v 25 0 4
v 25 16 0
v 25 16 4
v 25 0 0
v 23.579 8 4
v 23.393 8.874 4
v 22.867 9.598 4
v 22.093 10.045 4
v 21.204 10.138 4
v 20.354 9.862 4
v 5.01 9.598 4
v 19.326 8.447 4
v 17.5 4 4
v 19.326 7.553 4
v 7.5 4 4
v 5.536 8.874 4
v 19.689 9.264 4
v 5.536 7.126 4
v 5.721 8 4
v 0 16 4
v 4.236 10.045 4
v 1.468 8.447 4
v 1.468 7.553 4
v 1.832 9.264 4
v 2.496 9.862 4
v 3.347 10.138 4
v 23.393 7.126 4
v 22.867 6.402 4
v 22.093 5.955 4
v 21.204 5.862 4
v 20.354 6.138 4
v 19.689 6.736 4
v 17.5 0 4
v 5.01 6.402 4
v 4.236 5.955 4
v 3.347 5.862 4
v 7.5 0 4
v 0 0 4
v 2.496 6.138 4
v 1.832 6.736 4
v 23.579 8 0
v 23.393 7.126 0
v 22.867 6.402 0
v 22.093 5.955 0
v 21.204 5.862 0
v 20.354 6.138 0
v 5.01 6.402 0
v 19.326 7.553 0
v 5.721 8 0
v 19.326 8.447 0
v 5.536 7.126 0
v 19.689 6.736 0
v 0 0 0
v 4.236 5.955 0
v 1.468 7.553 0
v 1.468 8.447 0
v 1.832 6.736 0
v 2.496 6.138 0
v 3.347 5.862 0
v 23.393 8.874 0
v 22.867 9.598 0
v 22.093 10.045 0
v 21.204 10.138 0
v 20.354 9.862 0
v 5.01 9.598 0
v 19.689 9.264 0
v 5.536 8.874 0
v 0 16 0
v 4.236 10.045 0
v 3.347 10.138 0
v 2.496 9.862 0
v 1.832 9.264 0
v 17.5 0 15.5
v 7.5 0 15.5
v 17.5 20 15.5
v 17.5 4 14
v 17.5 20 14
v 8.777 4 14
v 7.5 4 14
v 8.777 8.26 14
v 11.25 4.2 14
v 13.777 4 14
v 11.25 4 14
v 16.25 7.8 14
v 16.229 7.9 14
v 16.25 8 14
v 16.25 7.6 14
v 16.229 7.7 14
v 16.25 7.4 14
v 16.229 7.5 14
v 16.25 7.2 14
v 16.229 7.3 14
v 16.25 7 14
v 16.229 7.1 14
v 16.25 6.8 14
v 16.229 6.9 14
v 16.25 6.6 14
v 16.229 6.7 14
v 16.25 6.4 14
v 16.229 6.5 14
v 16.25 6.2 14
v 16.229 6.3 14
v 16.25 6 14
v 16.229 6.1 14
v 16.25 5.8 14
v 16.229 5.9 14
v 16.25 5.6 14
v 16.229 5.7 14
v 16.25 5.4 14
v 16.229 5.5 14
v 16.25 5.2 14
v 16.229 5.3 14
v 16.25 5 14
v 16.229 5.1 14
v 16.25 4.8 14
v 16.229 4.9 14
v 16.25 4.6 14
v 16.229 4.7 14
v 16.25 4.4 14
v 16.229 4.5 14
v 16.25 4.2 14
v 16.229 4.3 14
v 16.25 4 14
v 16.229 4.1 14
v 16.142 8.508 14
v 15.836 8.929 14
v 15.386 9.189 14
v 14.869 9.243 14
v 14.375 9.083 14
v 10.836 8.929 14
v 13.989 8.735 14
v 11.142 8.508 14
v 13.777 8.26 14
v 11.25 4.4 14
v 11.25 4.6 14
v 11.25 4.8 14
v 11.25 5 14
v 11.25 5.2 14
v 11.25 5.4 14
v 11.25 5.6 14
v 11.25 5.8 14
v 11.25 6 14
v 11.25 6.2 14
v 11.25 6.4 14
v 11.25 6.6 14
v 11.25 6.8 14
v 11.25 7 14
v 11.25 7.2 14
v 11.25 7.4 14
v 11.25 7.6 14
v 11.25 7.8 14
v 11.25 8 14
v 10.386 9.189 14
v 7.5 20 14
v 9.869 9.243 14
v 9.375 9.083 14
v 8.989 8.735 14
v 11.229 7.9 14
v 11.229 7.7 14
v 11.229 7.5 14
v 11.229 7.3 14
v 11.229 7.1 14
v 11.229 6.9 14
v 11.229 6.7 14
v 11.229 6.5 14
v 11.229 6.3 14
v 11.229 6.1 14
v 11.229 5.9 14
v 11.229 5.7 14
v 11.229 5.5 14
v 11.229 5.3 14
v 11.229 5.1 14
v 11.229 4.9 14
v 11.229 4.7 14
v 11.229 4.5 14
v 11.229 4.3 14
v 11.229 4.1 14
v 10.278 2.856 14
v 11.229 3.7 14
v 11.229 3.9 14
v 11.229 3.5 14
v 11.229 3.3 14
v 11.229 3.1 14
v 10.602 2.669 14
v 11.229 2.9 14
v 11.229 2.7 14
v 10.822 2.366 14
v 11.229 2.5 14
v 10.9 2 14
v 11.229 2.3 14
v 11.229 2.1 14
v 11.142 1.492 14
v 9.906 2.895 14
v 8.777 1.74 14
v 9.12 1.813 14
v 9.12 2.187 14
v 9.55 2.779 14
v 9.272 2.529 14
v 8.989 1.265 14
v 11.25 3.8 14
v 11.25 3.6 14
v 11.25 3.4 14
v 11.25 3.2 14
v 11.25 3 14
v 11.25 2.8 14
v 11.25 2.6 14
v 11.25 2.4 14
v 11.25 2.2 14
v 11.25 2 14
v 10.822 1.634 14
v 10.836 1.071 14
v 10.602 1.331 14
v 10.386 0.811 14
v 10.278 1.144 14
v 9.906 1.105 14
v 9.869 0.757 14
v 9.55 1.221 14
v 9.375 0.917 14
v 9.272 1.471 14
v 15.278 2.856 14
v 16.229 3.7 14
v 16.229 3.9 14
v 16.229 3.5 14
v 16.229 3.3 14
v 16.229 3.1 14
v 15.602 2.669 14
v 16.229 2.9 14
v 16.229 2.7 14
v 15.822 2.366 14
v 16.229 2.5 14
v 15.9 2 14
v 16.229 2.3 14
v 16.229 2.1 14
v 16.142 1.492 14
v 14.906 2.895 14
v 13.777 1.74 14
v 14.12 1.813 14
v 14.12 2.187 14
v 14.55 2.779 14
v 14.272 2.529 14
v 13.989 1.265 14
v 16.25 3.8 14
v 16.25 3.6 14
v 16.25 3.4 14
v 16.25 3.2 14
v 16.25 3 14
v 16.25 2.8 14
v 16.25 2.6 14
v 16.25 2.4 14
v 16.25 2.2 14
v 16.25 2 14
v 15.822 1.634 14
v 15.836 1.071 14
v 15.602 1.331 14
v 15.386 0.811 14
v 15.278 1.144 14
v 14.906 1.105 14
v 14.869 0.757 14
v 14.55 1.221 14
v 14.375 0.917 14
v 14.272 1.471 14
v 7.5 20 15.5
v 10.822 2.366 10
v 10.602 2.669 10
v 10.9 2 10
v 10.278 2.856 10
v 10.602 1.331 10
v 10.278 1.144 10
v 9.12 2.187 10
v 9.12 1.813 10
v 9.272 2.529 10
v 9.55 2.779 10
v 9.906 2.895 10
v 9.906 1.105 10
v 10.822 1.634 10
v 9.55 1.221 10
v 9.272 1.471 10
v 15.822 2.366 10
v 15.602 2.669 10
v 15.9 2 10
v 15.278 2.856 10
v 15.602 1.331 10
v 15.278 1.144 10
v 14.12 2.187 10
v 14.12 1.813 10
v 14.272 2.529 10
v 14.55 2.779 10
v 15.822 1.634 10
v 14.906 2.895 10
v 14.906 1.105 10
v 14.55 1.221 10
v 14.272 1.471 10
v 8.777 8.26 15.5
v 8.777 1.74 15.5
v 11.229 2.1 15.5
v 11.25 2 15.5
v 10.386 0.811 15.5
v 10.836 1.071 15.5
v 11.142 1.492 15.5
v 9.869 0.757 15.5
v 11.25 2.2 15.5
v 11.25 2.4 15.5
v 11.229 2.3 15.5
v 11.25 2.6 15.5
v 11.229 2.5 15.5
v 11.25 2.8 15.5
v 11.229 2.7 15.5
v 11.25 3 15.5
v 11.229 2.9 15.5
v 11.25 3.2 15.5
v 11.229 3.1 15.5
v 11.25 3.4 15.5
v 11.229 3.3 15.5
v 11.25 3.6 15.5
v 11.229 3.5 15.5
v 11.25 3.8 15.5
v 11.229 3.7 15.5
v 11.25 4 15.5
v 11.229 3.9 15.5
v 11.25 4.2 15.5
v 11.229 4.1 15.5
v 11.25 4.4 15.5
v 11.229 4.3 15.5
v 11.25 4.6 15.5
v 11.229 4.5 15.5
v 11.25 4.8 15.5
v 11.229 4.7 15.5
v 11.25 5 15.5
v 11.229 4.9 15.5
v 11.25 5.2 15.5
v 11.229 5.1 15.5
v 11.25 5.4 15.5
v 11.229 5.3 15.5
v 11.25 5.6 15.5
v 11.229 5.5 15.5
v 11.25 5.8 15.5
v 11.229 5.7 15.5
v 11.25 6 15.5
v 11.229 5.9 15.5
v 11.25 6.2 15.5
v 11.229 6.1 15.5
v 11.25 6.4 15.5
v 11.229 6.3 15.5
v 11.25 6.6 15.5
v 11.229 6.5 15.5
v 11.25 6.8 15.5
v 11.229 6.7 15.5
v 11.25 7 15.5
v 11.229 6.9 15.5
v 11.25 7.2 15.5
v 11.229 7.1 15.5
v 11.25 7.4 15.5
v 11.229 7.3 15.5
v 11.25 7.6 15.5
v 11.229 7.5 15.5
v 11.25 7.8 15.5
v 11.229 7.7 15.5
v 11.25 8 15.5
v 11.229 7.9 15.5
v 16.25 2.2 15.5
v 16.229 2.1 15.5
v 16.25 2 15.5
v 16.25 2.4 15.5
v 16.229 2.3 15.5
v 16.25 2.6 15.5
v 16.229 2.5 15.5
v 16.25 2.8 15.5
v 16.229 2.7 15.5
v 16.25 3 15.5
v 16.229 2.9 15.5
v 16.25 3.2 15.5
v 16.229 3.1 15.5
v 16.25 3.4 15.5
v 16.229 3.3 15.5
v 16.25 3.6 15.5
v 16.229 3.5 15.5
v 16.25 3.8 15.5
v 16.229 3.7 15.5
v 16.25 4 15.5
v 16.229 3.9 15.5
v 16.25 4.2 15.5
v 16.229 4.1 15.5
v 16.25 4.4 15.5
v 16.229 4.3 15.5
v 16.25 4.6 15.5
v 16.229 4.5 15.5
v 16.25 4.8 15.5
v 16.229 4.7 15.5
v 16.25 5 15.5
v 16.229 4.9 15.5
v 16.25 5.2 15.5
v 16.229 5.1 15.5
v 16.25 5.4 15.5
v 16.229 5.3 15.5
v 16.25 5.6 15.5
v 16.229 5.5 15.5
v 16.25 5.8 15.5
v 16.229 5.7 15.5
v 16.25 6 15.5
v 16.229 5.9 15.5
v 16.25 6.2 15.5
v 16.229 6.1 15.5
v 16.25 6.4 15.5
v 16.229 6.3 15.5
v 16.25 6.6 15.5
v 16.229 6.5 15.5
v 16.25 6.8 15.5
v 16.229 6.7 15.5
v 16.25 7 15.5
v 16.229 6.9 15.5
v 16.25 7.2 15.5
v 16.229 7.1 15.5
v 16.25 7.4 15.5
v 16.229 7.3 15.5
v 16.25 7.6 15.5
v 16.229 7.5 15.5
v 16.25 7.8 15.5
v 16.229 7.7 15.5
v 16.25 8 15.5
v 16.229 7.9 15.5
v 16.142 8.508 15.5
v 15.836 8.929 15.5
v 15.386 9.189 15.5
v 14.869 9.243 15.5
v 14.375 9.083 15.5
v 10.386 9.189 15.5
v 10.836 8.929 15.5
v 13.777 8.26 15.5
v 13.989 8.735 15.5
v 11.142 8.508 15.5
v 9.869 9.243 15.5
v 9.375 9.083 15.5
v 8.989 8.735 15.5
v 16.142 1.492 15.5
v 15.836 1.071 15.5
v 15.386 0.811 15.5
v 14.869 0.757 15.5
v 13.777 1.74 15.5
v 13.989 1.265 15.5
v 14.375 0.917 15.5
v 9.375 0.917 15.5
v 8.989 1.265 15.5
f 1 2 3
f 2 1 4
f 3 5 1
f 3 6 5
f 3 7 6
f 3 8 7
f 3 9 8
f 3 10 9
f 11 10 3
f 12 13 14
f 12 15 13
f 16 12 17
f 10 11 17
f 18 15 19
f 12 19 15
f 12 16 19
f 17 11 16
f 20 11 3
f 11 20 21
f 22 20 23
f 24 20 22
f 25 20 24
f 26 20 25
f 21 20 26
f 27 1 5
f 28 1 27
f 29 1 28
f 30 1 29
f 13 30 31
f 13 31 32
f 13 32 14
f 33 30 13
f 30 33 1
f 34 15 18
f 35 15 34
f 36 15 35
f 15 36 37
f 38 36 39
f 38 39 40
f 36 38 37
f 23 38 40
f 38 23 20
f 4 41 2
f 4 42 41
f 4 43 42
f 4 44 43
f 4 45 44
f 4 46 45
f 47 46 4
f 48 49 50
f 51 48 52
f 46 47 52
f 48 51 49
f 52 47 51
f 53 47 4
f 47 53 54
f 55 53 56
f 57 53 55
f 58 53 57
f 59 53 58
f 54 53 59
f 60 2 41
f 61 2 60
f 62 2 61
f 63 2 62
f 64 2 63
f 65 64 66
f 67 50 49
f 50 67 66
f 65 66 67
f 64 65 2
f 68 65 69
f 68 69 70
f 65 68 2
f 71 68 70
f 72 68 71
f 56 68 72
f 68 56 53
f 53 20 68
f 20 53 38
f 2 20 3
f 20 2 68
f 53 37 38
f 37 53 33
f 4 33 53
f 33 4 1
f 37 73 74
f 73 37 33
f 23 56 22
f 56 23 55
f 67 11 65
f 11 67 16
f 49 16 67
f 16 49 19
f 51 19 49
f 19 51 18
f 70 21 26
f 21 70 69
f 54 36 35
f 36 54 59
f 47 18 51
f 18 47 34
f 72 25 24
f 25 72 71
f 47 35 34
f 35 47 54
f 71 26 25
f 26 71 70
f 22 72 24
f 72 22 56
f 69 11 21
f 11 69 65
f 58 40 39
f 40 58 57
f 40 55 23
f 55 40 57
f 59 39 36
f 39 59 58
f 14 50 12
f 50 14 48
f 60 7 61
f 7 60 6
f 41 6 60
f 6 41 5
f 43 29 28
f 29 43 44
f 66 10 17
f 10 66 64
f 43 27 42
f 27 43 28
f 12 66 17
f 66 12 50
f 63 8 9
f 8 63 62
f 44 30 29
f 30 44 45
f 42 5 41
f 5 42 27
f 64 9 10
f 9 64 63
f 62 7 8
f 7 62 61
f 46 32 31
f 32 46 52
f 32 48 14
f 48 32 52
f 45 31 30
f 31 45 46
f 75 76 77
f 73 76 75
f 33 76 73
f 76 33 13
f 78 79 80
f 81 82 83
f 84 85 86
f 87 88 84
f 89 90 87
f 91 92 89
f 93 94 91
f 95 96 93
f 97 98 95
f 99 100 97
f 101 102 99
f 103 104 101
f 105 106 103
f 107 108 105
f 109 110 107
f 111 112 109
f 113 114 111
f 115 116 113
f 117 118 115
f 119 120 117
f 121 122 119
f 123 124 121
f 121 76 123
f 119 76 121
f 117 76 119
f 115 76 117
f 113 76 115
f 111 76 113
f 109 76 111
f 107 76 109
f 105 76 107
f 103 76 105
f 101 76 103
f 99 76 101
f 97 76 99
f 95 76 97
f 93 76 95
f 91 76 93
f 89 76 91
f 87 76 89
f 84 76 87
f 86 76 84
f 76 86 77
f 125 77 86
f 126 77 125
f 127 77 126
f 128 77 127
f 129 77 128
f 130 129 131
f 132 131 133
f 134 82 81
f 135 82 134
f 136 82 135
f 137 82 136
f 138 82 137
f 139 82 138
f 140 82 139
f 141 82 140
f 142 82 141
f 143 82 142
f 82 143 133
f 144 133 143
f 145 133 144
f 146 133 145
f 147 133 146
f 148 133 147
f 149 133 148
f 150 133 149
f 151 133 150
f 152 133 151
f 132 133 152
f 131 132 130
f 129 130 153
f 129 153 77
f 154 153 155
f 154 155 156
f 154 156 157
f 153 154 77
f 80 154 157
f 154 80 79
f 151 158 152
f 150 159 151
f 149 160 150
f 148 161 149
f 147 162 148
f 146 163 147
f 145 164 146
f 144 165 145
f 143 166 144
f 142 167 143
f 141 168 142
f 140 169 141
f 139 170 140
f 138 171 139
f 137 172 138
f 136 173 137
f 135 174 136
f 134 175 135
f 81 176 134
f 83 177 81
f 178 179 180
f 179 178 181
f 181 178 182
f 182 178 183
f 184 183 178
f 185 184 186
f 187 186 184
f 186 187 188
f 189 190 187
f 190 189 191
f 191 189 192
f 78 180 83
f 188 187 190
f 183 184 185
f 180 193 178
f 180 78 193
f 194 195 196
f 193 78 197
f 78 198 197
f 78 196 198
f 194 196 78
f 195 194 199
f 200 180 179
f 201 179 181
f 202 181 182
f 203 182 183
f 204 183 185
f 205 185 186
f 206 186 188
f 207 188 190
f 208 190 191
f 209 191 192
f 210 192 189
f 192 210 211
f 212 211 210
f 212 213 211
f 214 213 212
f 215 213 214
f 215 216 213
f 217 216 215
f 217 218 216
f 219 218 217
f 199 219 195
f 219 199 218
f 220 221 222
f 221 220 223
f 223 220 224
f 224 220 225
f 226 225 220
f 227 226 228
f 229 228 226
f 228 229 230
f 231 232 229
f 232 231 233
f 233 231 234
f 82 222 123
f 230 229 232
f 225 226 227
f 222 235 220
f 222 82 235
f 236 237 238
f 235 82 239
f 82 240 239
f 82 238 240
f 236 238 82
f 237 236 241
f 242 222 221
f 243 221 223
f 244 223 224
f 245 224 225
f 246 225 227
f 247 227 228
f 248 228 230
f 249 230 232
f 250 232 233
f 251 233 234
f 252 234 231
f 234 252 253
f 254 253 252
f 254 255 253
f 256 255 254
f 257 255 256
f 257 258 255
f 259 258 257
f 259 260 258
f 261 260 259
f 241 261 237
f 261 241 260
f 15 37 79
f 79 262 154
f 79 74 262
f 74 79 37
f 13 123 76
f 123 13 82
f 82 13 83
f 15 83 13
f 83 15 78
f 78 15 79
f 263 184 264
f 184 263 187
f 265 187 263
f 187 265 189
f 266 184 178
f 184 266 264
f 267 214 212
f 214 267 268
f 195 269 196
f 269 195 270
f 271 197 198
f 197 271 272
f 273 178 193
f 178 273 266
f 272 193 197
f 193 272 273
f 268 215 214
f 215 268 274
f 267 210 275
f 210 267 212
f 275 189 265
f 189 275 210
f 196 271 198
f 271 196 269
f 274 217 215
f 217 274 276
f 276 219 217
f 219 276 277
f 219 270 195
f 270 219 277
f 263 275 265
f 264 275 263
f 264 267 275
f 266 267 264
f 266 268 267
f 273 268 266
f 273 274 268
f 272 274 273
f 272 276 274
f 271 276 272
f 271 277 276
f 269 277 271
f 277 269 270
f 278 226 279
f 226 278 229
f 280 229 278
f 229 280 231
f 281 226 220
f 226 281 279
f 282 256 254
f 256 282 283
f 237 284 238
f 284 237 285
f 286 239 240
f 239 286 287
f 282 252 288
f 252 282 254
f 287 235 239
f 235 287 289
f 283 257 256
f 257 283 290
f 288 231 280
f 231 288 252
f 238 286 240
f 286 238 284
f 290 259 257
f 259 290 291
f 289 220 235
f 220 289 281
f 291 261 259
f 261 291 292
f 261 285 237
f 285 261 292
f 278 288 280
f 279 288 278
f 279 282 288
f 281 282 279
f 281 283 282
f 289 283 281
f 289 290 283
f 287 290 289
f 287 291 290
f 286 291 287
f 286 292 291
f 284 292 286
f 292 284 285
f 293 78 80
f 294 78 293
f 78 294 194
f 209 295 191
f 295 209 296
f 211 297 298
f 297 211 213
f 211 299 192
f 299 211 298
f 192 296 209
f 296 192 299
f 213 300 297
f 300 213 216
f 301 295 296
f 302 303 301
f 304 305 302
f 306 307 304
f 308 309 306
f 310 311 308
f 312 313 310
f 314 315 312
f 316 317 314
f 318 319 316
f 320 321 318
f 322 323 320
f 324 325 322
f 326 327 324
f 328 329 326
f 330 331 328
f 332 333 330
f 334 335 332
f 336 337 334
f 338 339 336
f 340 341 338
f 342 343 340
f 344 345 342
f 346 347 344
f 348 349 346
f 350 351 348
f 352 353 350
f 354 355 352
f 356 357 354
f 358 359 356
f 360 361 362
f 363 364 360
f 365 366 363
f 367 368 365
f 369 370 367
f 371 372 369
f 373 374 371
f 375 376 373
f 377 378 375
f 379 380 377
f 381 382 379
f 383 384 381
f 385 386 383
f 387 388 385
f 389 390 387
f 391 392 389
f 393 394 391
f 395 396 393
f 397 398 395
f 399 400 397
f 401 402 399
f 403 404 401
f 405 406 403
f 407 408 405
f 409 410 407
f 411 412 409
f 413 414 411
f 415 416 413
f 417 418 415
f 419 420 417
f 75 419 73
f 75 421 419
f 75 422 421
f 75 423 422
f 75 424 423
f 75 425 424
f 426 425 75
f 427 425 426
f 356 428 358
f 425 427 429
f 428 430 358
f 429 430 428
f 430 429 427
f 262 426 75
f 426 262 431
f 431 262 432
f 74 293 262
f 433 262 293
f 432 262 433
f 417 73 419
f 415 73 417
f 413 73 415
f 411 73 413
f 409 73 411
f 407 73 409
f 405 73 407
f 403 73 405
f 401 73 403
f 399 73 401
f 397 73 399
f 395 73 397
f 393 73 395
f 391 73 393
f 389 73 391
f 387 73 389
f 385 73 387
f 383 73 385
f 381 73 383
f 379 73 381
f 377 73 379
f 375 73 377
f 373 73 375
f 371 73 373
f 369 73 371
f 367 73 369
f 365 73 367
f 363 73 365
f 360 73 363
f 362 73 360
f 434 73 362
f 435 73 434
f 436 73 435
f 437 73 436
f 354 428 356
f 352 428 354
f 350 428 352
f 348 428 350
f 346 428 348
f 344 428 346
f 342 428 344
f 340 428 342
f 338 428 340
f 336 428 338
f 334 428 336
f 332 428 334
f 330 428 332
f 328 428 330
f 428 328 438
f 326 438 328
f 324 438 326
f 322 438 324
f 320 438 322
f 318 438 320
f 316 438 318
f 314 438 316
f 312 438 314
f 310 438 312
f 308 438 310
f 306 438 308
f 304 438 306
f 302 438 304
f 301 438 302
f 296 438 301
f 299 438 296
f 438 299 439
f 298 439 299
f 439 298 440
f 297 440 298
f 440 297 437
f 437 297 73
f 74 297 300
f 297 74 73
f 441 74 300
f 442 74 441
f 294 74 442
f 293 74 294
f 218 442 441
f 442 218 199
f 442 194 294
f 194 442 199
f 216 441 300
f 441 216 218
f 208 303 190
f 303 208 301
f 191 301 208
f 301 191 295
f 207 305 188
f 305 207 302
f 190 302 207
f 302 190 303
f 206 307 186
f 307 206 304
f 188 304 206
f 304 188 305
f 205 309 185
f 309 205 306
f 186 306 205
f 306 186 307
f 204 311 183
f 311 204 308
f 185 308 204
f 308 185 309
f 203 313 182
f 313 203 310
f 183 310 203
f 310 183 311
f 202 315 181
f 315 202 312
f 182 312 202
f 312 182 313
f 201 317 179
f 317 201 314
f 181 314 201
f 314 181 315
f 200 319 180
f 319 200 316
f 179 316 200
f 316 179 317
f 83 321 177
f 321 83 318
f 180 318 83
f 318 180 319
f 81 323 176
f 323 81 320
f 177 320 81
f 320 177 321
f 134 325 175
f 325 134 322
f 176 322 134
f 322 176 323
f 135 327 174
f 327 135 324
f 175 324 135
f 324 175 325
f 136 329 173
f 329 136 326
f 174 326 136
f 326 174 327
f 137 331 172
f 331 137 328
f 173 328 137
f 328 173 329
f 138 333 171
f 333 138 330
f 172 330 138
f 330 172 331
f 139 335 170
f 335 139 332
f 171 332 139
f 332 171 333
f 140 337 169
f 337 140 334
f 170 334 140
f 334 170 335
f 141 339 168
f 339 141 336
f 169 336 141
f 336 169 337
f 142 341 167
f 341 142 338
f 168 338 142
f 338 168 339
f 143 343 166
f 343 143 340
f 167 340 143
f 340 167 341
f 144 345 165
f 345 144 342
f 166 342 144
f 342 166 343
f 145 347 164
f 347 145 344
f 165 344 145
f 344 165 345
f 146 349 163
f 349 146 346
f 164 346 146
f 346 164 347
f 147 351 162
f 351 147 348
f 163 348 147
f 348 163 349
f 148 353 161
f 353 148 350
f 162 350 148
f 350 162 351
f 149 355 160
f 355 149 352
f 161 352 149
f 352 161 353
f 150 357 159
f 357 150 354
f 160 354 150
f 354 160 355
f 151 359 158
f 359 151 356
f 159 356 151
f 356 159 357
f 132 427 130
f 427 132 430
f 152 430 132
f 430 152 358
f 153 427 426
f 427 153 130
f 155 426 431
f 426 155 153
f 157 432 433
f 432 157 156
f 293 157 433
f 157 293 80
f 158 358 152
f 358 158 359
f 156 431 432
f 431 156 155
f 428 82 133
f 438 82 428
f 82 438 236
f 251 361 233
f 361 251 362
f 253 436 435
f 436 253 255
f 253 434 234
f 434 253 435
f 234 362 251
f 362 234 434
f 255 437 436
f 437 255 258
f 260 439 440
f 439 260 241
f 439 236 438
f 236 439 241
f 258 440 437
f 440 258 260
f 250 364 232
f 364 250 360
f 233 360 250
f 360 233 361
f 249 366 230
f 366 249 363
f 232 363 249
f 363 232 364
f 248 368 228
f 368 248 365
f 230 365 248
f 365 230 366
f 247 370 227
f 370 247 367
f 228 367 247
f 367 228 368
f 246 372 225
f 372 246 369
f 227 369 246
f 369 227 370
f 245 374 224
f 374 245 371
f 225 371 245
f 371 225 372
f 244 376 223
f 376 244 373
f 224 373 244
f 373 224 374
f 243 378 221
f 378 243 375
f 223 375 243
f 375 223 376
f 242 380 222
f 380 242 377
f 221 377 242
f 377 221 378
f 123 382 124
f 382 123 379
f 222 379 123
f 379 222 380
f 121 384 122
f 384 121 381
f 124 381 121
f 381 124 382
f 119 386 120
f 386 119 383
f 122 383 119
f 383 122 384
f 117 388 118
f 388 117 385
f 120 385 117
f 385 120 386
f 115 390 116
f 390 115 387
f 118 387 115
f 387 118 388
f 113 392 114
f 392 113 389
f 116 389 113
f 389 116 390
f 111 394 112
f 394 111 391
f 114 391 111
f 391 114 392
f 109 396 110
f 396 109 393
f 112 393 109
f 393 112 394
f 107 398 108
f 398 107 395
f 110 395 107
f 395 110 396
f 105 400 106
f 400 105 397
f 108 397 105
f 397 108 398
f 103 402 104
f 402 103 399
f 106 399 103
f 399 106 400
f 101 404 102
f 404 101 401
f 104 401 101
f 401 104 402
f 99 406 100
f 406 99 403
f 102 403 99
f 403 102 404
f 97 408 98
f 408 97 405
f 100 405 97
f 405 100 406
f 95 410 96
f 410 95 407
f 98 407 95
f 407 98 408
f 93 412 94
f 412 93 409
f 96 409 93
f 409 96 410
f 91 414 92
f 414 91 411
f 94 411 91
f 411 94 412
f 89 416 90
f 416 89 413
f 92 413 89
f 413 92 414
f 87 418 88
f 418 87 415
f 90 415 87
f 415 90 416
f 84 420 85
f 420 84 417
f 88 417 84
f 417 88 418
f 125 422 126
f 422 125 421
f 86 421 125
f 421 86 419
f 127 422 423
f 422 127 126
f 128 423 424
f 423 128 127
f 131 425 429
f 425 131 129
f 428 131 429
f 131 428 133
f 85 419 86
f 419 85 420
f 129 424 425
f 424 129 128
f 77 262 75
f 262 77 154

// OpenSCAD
WallThickness = 4;

BaseWidth = 25;
BaseDepth = 16;
BaseHoleDiameter = 4.3;

BaseToFlagDistance = 10+WallThickness;
BaseToFlagWidth = 10;

FlagThickness = 1.5;
FlagHeight = 20;

AdjustHoleOutsideDiameter = 2.5;
AdjustHoleInsideDiameter = 1.8;

difference() {
    cube(size=[BaseWidth, BaseDepth, WallThickness], center=false);
    translate([BaseWidth/7, BaseDepth/2, 0])
    cylinder(h=WallThickness, d=BaseHoleDiameter, center=false, $fn=15);
    translate([BaseWidth/7*6, BaseDepth/2, 0])
    cylinder(h=WallThickness, d=BaseHoleDiameter, center=false, $fn=15);
    
}

translate([(BaseWidth-BaseToFlagWidth)/2, 0, 0])
difference() {
cube(size=[BaseToFlagWidth, WallThickness, BaseToFlagDistance], center=false);
    translate([BaseToFlagWidth/4, WallThickness/2, BaseToFlagDistance-WallThickness])
    cylinder(h=WallThickness, d=AdjustHoleInsideDiameter, center=false, $fn=15);
    translate([BaseToFlagWidth/4*3, WallThickness/2, BaseToFlagDistance-WallThickness])
    cylinder(h=WallThickness, d=AdjustHoleInsideDiameter, center=false, $fn=15);
}

// Flag
translate([(BaseWidth-BaseToFlagWidth)/2, 0, BaseToFlagDistance])

difference() {
cube(size=[BaseToFlagWidth, FlagHeight, FlagThickness], center=false);

for ( i = [0 : 30] ){
    translate([BaseToFlagWidth/4, WallThickness/2+i*0.2, 0])
    cylinder(h=FlagThickness, d=AdjustHoleOutsideDiameter, center=false, $fn=15);
}
for ( i = [0 : 30] ){
    translate([BaseToFlagWidth/4*3, WallThickness/2+i*0.2, 0])
    cylinder(h=FlagThickness, d=AdjustHoleOutsideDiameter, center=false, $fn=15);
}
}



/*
WallThickness = 1.5;
BaseHeight = 123+WallThickness*2;
BaseWidth = 101+WallThickness*2;
BaseDepth = 30;
CornerRadius = 3;

LCDWidth = 80.5;
LCDHeight = 50.5;
LCDTopOffset = 9+WallThickness;
LCDLeftOffset = 9+WallThickness;

ResetButtonDiameter = 6;
ResetButtonBottomOffet = 8.5+WallThickness;
ResetButtonLeftOffet = 70.5+WallThickness;

RotaryEncoderDiameter = 8;
RotaryEncoderBottomOffet = 19+WallThickness;
RotaryEncoderLeftOffet = 87.5+WallThickness;

CardButtonDiameter = 6;
CardButtonBottomOffet = 44.5+WallThickness;
CardButtonLeftOffet = 78.5+WallThickness;

TFCardHeight = 2;
TFCardWidth = 14;
TFCardBottomOffset = 15+WallThickness;
TFCardFrontOffset = 19+WallThickness;

MountingHoleDiameter = 5.5;

module RoundedRectangle($Width=BaseWidth, $Depth=BaseDepth, $Radius=CornerRadius) 
{
    polygon(points = [[$Radius, 0], [$Width-$Radius, 0],[$Width, $Radius], [$Width, $Depth-$Radius], [$Width-$Radius, $Depth], [$Radius, $Depth], [0, $Depth-$Radius], [0, $Radius]], paths=[[0,1,2,3,4,5,6,7]]);
        
    translate([$Radius,$Radius,0]){
        circle(r=$Radius);
    }        
    translate([$Width-$Radius,$Radius,0]){
        circle(r=$Radius);
    }
    
    translate([$Width-$Radius,$Depth-$Radius,0]){ 
        circle(r=$Radius);
    }
   
    translate([$Radius,$Depth-$Radius,0]){ 
        circle(r=$Radius);
    }
}

module base3D($Width=BaseWidth, $Depth=BaseDepth, $Height=BaseHeight, $Radius=CornerRadius, $Thickness=WallThickness)
{
    difference()
    {
        linear_extrude(height = $Height, center = false, convexity = 0, twist = 0)
        RoundedRectangle($Width, $Depth, $Radius);
        translate([$Thickness, $Thickness, $Thickness]) {
        linear_extrude(height = $Height, center = false, convexity = 0, twist = 0)
        RoundedRectangle($Width-$Thickness*2, $Depth-$Thickness*2, $Radius);
        }
    }
}


difference()
{
    base3D(BaseWidth, BaseDepth, BaseHeight, CornerRadius, WallThickness);
    // Make back open
    translate([0, BaseDepth-WallThickness*2, 10])
        cube(size=[BaseWidth, BaseDepth, BaseHeight], center=false);

    translate([0, BaseDepth-WallThickness*2, 110])
    rotate([45, 0, 0])
        cube(size=[BaseWidth, BaseDepth, BaseHeight], center=false);

    translate([0, BaseDepth-WallThickness*2+3, 30])
    rotate([7, 0, 0])
        cube(size=[BaseWidth, BaseDepth, BaseHeight], center=false);
    
    // LCD window
    translate([LCDLeftOffset, WallThickness, BaseHeight-LCDHeight-LCDTopOffset])
    rotate([90, 0, 0])
        cube(size=[LCDWidth, LCDHeight, WallThickness], center=false);
    // Reset button
    translate([ResetButtonLeftOffet, WallThickness, ResetButtonBottomOffet])
    rotate([90, 0, 0])
        cylinder(h=WallThickness, d=ResetButtonDiameter, center=false, $fn=30);
    // Rotary Encoder
    translate([RotaryEncoderLeftOffet, WallThickness, RotaryEncoderBottomOffet])
    rotate([90, 0, 0])
        cylinder(h=WallThickness, d=RotaryEncoderDiameter, center=false, $fn=30);
    // Card-In Button
    translate([CardButtonLeftOffet, WallThickness, CardButtonBottomOffet])
    rotate([90, 0, 0])
        cylinder(h=WallThickness, d=CardButtonDiameter, center=false, $fn=30);
    // TF Card on the side
    translate([WallThickness,TFCardFrontOffset,TFCardBottomOffset])
    rotate([0, -90, 0])
        cube(size=[TFCardWidth, TFCardHeight, WallThickness], center=false);
    // Mouting holes for 2020
    translate([BaseWidth-WallThickness-MountingHoleDiameter, BaseDepth-WallThickness-MountingHoleDiameter])
        cylinder(h=WallThickness, d=MountingHoleDiameter, center=false, $fn=30);
    translate([BaseWidth/4*2, BaseDepth-WallThickness-MountingHoleDiameter])
        cylinder(h=WallThickness, d=MountingHoleDiameter, center=false, $fn=30);
    translate([WallThickness+MountingHoleDiameter, BaseDepth-WallThickness-MountingHoleDiameter])
        cylinder(h=WallThickness, d=MountingHoleDiameter, center=false, $fn=30);

    translate([BaseWidth-WallThickness-MountingHoleDiameter, WallThickness+MountingHoleDiameter])
        cylinder(h=WallThickness, d=MountingHoleDiameter, center=false, $fn=30);
    translate([BaseWidth/4*2, WallThickness+MountingHoleDiameter])
        cylinder(h=WallThickness, d=MountingHoleDiameter, center=false, $fn=30);
    translate([WallThickness+MountingHoleDiameter, WallThickness+MountingHoleDiameter])
        cylinder(h=WallThickness, d=MountingHoleDiameter, center=false, $fn=30);

}

    translate([64, 0, 52])
    rotate([90, 0, 0])
    linear_extrude(height = WallThickness/2){
        text("CARD IN", size=5, font="Arial Black");
    }

    translate([10, 0, 50])
    rotate([90, 0, 0])
    linear_extrude(height = WallThickness/2){
        text("DIY 12864", size=6, font="Arial Black");
    }

    translate([6, 0, 35])
    rotate([90, 0, 0])
    linear_extrude(height = WallThickness/2){
        text("IBE Group, Inc.", size=6, font="Arial Black");
    }
    translate([5, 0, 20])
    rotate([90, 0, 0])
    linear_extrude(height = WallThickness/2){
        text("Copyright© 2019", size=6, font="Arial Black");
    }

    translate([41.5, 0, 7.5])
    rotate([90, 0, 0])
    linear_extrude(height = WallThickness/2){
        text("RESET", size=5, font="Arial Black");
    }
*/
